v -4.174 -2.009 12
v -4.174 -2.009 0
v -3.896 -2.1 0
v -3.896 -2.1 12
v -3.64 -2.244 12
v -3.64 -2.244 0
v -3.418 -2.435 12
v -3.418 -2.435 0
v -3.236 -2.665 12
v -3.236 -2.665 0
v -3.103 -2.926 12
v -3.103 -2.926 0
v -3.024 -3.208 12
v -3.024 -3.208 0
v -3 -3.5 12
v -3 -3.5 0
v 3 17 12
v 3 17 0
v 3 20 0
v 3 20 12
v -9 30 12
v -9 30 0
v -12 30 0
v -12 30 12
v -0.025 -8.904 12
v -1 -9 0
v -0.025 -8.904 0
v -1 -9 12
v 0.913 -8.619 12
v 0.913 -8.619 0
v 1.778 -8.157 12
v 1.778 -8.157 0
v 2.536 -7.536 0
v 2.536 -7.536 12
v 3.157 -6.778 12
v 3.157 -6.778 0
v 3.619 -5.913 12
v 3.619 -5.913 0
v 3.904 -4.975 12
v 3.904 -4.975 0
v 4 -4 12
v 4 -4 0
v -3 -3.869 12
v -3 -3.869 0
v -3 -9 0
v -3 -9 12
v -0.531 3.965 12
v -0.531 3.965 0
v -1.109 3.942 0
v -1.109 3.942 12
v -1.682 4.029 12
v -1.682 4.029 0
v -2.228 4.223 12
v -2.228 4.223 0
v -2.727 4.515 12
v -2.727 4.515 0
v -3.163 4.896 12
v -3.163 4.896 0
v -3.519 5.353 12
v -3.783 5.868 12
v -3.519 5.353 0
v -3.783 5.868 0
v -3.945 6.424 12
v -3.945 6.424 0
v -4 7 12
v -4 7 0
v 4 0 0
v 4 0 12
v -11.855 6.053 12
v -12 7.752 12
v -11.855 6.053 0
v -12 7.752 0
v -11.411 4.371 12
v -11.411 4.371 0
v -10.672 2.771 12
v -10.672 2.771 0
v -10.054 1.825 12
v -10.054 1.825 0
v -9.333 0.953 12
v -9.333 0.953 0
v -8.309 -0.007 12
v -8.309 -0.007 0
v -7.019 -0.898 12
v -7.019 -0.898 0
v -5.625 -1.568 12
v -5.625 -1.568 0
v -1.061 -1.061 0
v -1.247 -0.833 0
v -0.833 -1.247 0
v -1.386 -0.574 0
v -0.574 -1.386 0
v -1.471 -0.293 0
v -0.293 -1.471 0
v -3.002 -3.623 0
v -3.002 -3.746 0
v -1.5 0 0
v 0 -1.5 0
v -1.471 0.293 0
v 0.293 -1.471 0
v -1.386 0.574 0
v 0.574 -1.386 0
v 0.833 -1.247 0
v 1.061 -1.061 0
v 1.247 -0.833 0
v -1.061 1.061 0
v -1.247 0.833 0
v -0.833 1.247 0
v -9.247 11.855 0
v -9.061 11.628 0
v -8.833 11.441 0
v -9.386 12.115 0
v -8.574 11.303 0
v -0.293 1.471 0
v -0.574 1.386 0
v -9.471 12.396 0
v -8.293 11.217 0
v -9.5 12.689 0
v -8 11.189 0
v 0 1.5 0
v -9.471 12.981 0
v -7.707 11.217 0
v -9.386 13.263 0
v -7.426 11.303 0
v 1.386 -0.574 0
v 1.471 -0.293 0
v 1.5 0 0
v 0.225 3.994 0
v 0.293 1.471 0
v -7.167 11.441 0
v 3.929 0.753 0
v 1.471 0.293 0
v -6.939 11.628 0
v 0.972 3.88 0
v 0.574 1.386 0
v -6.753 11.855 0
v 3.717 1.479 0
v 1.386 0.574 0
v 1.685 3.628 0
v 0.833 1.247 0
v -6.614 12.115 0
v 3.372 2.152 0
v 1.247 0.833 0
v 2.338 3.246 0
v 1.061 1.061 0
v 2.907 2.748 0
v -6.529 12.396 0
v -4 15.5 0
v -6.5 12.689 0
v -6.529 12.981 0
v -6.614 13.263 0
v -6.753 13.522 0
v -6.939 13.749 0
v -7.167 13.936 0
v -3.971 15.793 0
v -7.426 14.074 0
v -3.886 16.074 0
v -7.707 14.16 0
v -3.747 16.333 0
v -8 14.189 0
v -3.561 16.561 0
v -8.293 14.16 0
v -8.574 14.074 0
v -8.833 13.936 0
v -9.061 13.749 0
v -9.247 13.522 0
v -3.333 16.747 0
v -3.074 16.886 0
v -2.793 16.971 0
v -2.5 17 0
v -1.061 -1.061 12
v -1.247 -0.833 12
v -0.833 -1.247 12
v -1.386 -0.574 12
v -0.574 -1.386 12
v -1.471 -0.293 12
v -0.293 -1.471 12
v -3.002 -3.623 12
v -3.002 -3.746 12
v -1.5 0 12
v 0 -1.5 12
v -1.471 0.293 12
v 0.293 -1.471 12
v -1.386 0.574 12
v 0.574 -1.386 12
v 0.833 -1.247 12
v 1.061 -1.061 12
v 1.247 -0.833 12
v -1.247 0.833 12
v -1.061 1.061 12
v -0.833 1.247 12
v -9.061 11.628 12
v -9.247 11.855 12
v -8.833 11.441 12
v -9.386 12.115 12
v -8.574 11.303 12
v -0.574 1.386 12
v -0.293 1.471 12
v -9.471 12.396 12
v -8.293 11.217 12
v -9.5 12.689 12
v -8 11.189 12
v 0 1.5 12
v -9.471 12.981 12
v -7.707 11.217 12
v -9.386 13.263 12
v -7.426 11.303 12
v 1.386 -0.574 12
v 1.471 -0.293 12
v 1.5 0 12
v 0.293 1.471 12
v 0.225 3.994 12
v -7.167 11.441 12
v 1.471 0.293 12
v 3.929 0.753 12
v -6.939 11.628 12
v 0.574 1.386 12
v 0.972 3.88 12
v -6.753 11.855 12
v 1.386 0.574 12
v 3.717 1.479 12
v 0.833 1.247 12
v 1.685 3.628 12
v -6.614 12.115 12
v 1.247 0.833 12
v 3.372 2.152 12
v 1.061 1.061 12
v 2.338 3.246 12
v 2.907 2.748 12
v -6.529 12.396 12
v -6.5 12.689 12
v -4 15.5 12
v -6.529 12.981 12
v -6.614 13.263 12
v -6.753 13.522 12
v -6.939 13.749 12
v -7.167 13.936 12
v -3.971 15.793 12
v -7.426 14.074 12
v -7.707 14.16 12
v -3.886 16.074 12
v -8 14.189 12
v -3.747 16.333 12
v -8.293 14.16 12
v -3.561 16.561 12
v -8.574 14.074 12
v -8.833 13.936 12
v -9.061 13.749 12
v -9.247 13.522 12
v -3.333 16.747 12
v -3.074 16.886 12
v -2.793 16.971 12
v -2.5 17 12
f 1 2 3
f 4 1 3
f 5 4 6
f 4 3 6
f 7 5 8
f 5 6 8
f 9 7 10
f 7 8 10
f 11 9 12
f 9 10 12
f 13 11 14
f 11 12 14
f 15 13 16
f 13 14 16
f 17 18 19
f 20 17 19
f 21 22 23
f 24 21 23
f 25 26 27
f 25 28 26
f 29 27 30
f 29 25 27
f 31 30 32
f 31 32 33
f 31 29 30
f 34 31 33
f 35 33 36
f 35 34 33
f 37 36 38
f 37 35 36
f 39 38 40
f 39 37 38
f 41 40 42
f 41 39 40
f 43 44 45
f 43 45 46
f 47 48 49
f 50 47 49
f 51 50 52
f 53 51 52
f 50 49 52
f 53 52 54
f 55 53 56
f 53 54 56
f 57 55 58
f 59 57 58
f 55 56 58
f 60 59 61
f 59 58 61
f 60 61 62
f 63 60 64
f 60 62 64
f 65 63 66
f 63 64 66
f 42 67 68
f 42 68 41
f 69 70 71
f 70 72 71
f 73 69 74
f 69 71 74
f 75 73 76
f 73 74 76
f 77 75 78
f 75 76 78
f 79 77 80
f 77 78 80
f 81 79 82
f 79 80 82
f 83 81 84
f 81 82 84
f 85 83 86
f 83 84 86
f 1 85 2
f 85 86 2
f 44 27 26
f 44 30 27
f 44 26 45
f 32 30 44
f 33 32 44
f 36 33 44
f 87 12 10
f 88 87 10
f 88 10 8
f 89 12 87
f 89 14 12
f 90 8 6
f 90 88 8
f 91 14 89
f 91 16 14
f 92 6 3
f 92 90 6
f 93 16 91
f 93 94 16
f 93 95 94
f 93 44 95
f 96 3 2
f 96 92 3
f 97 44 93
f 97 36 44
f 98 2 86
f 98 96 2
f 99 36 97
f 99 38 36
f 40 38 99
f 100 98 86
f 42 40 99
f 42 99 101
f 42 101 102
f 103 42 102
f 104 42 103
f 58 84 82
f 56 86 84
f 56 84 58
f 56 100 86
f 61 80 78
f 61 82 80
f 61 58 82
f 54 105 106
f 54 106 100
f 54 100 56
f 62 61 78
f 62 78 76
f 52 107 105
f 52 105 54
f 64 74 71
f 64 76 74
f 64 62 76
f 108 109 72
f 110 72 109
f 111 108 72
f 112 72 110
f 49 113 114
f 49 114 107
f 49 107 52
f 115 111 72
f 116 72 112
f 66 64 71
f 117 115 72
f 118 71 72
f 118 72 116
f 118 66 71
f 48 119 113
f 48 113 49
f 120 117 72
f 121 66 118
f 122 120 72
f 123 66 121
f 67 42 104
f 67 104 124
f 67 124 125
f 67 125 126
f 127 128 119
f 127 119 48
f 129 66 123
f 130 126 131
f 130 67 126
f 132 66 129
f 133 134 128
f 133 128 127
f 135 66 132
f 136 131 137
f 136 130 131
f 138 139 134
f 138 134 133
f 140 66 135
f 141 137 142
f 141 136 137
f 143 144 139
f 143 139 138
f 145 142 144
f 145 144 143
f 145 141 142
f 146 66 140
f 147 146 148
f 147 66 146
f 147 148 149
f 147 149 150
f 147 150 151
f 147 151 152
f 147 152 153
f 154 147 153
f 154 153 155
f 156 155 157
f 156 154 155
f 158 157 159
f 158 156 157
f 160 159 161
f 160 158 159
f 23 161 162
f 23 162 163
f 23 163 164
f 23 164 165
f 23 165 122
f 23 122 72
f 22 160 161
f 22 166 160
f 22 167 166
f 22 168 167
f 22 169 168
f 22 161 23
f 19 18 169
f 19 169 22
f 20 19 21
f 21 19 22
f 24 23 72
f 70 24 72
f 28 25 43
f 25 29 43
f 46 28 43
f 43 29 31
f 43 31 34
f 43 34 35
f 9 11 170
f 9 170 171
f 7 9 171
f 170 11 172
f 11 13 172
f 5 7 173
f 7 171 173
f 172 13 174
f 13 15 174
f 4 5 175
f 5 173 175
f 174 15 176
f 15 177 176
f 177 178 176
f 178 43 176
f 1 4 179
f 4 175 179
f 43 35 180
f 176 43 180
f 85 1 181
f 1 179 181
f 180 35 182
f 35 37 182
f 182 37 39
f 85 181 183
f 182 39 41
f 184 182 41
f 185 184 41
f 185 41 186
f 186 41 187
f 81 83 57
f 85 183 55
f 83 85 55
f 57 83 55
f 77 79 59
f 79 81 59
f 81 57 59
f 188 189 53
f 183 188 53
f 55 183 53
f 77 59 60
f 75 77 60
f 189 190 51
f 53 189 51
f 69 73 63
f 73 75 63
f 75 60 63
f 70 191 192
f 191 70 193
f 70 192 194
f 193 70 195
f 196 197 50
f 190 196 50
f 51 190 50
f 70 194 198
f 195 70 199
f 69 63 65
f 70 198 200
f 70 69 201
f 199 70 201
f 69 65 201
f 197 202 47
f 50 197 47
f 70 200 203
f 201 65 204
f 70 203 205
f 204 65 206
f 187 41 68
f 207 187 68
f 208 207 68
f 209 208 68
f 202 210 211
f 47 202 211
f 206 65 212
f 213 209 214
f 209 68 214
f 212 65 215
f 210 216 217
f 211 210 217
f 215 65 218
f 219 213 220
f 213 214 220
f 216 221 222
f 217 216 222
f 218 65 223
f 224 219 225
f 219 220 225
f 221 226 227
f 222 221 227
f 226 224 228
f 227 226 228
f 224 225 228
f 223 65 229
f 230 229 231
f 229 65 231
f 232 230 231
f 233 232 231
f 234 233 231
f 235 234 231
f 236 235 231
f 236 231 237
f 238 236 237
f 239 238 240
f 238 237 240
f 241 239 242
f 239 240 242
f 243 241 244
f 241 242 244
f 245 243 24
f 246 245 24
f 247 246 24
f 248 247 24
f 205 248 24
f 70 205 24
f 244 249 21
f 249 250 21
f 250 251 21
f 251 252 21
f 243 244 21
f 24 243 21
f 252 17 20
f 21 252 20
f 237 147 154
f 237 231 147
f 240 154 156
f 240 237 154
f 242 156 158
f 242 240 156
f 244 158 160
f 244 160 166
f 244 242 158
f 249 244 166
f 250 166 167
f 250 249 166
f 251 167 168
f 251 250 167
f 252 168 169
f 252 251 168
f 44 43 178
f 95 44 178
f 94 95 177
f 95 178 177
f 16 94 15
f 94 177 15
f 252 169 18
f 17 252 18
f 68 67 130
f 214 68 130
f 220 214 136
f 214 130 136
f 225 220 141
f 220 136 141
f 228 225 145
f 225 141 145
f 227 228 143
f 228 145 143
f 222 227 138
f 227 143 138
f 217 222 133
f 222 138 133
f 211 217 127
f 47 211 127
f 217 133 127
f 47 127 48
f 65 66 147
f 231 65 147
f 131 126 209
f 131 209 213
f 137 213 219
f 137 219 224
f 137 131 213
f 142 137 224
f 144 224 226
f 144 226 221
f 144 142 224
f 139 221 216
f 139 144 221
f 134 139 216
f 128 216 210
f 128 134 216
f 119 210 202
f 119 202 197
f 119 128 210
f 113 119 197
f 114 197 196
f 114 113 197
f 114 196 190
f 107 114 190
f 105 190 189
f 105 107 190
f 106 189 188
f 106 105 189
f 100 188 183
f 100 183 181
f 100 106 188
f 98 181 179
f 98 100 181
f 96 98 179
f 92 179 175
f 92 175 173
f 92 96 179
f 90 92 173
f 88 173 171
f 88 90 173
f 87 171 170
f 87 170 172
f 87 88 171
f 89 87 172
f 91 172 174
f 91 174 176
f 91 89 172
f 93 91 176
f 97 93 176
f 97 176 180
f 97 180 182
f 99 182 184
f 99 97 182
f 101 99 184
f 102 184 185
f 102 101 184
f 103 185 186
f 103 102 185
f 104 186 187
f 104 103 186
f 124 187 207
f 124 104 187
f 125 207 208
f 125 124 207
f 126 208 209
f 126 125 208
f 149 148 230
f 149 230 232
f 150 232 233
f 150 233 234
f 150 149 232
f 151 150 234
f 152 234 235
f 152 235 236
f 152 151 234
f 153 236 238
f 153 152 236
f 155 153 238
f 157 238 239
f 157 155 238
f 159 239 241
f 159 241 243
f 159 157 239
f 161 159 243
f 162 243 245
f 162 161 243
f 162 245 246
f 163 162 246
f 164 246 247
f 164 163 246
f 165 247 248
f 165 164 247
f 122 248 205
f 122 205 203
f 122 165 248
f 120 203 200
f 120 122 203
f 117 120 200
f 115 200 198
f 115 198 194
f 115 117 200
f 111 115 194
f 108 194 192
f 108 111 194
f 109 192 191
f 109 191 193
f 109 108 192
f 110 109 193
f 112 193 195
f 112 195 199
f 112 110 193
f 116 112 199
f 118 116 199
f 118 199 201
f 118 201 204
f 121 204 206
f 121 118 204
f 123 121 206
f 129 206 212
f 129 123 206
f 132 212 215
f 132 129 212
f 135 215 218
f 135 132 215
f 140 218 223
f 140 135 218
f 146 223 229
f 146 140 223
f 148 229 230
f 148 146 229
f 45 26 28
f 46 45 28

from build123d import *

# Parameters (mm, degrees)
SKETCH_1_R          = 1.5
EXTRUDE_1_DEPTH     = 12
FILLET_1_R          = 1.5
EXTRUDE_2_DEPTH     = 12
SKETCH_3_W          = 12
SKETCH_3_H          = 7
EXTRUDE_4_DEPTH     = 3
FILLET_3_R          = 5
SKETCH_4_R          = 1.5
CUT_EXTRUDE_1_DEPTH = 35.467375879
FILLET_4_R          = 10
FILLET_5_R          = 10


with BuildPart() as part:
    # 草图1 → 凸台-拉伸1 (new body)
    with BuildSketch(Plane.XY):
        with BuildLine():
            Line((-4, 7), (-4, 17))
            Line((-4, 17), (3, 17))
            Line((3, 17), (3, 20))
            Line((3, 20), (-9, 30))
            Line((-9, 30), (-12, 30))
            Line((-12, 30), (-12, 7))
            ThreePointArc((-12, 7), (-8.222207225, -1.325379685), (0.530973451, -3.96460177))
            ThreePointArc((0.530973451, -3.96460177), (3.96460177, 0.530973451), (-0.530973451, 3.96460177))
            ThreePointArc((-0.530973451, 3.96460177), (-2.954170362, 4.695233872), (-4, 7))
        make_face()
        Circle(SKETCH_1_R, mode=Mode.SUBTRACT)
        with Locations((-8, 12.68857754)):
            Circle(SKETCH_1_R, mode=Mode.SUBTRACT)
    extrude(amount=EXTRUDE_1_DEPTH)

    # 圆角1
    fillet_1_edges = [part.edges().sort_by_distance(p)[0] for p in [
        (-4, 17, 6),
    ]]
    fillet(fillet_1_edges, radius=FILLET_1_R)

    # 草图2 → 凸台-拉伸2 (add)
    with BuildSketch(Plane(origin=(0, 0, 0), x_dir=(-1, 0, 0), z_dir=(0, 0, -1))):
        Polygon((-4, 0), (-4, -9), (0, -9), (0, -4.022703843), align=None)
    extrude(amount=-EXTRUDE_2_DEPTH)

    # 草图3 → 凸台-拉伸4 (add)
    with BuildSketch(Plane.ZY):
        with Locations((6, -5.5)):
            Rectangle(SKETCH_3_W, SKETCH_3_H)
    extrude(amount=EXTRUDE_4_DEPTH)

    # 圆角3
    fillet_3_edges = [part.edges().sort_by_distance(p)[0] for p in [
        (4, -9, 6),
    ]]
    fillet(fillet_3_edges, radius=FILLET_3_R)

    # 草图4 → 切除-拉伸1 (cut, through all)
    with BuildSketch(Plane(origin=(0, 0, 0), x_dir=(-1, 0, 0), z_dir=(0, 0, -1))):
        with Locations((4.5, -3.473180033)):
            Circle(SKETCH_4_R)
    extrude(amount=-CUT_EXTRUDE_1_DEPTH, mode=Mode.SUBTRACT)

    # 圆角4
    fillet_4_edges = [part.edges().sort_by_distance(p)[0] for p in [
        (-5.884075597, -2.894963169, 6),
    ]]
    fillet(fillet_4_edges, radius=FILLET_4_R)

    # 圆角5
    # the kernel refuses this fillet: 10 mm, written as the material it takes off along each edge
    with BuildSketch(Plane(origin=(-3.050425983, -3.858842021, 12.906172426), x_dir=(0.1384631917279628, 0.990367580515692, 0), z_dir=(0, 0, -1))) as fillet_5_piece_1:
        with BuildLine():
            CenterArc((1.570698872, 9.926740679), FILLET_5_R, 260.94796551, 2.112432444)
            ThreePointArc((-0.002615053, 0.051282042), (-0.001337281, 0.025639504), (0, 0))
            ThreePointArc((0, 0), (0.181234485, 0.010988898), (0.36246897, 0))
        make_face()
    extrude(amount=13.812344852, mode=Mode.SUBTRACT)


solid = part.part
